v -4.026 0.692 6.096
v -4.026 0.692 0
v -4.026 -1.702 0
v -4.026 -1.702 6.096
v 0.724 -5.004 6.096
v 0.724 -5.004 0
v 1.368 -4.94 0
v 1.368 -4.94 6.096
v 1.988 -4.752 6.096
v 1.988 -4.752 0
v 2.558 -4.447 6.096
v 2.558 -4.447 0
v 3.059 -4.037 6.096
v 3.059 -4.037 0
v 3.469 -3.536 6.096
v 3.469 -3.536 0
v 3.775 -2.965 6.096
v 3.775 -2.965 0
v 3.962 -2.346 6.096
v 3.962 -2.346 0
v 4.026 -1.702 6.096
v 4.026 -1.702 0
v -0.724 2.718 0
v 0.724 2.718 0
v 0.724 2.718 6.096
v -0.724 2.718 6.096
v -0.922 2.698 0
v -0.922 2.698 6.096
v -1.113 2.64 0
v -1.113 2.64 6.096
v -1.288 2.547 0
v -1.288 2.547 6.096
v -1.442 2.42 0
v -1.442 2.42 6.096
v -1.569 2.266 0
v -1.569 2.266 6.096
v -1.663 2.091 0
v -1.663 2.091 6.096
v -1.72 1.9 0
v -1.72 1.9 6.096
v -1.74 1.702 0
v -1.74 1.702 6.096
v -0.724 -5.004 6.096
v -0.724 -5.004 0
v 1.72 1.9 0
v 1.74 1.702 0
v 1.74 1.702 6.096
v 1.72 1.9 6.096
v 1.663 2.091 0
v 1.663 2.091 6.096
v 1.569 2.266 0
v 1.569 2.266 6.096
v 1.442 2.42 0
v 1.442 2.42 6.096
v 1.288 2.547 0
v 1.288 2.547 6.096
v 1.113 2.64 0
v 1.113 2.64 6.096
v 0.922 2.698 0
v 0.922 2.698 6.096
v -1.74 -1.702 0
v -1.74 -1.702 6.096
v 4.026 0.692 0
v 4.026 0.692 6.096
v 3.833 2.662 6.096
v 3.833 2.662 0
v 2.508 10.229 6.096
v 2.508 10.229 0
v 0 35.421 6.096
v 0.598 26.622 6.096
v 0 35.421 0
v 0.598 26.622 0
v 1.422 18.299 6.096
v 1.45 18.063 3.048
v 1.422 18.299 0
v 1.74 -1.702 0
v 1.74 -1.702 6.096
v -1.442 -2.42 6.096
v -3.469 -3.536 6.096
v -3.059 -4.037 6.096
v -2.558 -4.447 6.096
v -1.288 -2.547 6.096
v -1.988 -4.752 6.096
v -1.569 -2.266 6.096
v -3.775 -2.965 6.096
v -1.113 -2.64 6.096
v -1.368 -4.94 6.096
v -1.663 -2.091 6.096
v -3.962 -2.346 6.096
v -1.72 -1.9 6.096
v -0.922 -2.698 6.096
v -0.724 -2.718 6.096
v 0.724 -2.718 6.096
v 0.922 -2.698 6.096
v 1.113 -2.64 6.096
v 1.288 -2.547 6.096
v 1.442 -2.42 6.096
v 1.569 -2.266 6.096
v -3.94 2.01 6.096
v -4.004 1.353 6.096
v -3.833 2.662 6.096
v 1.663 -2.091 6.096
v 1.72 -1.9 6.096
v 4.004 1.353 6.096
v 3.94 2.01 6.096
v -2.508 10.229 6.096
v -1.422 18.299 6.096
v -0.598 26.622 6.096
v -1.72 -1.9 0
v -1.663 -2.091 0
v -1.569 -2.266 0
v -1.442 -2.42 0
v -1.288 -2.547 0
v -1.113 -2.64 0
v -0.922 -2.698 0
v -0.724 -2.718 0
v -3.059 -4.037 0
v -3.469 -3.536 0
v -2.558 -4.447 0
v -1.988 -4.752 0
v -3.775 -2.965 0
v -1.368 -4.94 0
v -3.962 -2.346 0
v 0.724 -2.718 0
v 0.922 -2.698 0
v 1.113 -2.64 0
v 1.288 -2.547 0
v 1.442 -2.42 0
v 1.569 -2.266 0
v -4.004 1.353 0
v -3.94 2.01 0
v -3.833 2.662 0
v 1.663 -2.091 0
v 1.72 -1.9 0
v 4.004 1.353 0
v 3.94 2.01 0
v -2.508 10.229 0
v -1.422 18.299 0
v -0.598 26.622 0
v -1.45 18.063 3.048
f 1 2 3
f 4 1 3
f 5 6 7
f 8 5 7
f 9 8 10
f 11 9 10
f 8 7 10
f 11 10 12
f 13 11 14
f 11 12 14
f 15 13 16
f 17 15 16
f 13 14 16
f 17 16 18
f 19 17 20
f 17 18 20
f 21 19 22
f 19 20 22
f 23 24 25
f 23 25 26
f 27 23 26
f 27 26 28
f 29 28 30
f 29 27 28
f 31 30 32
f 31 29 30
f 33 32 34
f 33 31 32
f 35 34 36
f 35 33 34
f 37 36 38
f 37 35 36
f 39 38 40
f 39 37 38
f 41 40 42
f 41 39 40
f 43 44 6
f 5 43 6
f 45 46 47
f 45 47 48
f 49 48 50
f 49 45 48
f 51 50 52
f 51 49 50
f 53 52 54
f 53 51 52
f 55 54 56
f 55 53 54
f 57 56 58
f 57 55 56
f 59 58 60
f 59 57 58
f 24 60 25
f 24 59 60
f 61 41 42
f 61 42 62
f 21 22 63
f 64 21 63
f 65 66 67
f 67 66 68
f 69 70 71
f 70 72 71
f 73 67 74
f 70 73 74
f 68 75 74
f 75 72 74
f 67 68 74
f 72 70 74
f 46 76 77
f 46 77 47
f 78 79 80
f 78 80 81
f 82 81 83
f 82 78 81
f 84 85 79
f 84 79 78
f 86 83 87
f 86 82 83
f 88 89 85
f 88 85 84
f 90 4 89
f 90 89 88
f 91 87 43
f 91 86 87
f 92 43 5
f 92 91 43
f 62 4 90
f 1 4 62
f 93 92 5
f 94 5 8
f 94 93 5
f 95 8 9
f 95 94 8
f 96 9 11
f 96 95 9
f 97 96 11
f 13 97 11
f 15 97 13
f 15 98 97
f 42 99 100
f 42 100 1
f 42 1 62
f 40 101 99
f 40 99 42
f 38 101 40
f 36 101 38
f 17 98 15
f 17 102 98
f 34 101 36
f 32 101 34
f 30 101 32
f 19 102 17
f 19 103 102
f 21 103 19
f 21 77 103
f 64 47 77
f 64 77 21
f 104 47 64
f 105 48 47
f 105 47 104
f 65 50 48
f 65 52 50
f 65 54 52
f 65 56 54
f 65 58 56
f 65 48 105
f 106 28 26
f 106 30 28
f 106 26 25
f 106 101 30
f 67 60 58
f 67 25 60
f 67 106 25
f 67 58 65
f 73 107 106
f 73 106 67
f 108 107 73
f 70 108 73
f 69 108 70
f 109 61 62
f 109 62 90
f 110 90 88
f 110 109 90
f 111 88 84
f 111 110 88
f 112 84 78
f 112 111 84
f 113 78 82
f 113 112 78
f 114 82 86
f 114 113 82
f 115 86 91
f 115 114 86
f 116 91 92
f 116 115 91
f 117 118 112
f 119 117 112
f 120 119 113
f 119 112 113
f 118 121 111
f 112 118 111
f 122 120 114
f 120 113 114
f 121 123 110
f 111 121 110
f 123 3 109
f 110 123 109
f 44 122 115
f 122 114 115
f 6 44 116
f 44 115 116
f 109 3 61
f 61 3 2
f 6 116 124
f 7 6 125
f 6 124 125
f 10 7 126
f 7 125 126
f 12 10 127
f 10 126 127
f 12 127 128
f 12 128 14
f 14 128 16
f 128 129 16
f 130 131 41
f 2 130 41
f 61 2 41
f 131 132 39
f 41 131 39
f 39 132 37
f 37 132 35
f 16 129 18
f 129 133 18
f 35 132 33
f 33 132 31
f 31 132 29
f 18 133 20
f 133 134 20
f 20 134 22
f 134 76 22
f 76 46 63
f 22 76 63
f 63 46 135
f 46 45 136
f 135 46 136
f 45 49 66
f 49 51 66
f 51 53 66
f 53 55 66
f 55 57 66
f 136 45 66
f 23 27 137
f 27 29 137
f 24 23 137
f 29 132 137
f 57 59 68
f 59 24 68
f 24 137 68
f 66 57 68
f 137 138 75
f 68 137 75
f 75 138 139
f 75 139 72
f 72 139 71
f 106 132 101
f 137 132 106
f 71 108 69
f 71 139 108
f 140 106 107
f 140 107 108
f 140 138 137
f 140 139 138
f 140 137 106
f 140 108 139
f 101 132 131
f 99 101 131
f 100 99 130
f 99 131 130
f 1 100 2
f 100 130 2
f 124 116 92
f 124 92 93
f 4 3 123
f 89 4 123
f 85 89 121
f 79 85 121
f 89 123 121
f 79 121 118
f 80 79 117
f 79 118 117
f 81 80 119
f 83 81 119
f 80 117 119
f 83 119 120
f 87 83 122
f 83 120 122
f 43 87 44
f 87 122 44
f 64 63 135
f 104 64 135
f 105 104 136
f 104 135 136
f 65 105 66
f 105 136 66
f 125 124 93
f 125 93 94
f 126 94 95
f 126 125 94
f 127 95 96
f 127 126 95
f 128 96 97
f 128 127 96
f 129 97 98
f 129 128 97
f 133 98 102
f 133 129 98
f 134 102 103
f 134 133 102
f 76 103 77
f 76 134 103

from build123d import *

# Parameters (mm, degrees)
BOSS_EXTRUDE2_DEPTH = 6.096


with BuildPart() as part:
    # Sketch1 → Boss-Extrude2 (new body)
    with BuildSketch(Plane.XY):
        with BuildLine():
            Line((-4.0259, 0.692415095), (-4.0259, -1.7018))
            ThreePointArc((-4.0259, -1.7018), (-3.058766591, -4.036666591), (-0.7239, -5.0038))
            Line((-0.7239, -5.0038), (0.7239, -5.0038))
            ThreePointArc((0.7239, -5.0038), (3.058766591, -4.036666591), (4.0259, -1.7018))
            Line((4.0259, -1.7018), (4.0259, 0.692415095))
            ThreePointArc((4.0259, 0.692415095), (3.977581548, 1.682110135), (3.833085773, 2.662391684))
            add(Edge.make_bspline(
                [(3.833085773, 2.662391684), (2.882993145, 7.469428366), (1.294052888, 17.736271143), (0.32760263, 29.308652747), (0, 35.421228256)],
                knots=[0.032373922, 0.032373922, 0.032373922, 0.032373922, 0.516186961, 1, 1, 1, 1], degree=3))
            add(Edge.make_bspline(
                [(-3.833085773, 2.662391684), (-2.882993145, 7.469428366), (-1.294052888, 17.736271143), (-0.32760263, 29.308652747), (0, 35.421228256)],
                knots=[0.032373922, 0.032373922, 0.032373922, 0.032373922, 0.516186961, 1, 1, 1, 1], degree=3))
            ThreePointArc((-3.833085773, 2.662391684), (-3.977581548, 1.682110135), (-4.0259, 0.692415095))
        make_face()
        with BuildLine():
            Line((-1.7399, 1.7018), (-1.7399, -1.7018))
            ThreePointArc((-1.7399, -1.7018), (-1.44232049, -2.42022049), (-0.7239, -2.7178))
            Line((-0.7239, -2.7178), (0.7239, -2.7178))
            ThreePointArc((0.7239, -2.7178), (1.44232049, -2.42022049), (1.7399, -1.7018))
            Line((1.7399, -1.7018), (1.7399, 1.7018))
            ThreePointArc((1.7399, 1.7018), (1.44232049, 2.42022049), (0.7239, 2.7178))
            Line((0.7239, 2.7178), (-0.7239, 2.7178))
            ThreePointArc((-0.7239, 2.7178), (-1.44232049, 2.42022049), (-1.7399, 1.7018))
        make_face(mode=Mode.SUBTRACT)
    extrude(amount=BOSS_EXTRUDE2_DEPTH)


solid = part.part
